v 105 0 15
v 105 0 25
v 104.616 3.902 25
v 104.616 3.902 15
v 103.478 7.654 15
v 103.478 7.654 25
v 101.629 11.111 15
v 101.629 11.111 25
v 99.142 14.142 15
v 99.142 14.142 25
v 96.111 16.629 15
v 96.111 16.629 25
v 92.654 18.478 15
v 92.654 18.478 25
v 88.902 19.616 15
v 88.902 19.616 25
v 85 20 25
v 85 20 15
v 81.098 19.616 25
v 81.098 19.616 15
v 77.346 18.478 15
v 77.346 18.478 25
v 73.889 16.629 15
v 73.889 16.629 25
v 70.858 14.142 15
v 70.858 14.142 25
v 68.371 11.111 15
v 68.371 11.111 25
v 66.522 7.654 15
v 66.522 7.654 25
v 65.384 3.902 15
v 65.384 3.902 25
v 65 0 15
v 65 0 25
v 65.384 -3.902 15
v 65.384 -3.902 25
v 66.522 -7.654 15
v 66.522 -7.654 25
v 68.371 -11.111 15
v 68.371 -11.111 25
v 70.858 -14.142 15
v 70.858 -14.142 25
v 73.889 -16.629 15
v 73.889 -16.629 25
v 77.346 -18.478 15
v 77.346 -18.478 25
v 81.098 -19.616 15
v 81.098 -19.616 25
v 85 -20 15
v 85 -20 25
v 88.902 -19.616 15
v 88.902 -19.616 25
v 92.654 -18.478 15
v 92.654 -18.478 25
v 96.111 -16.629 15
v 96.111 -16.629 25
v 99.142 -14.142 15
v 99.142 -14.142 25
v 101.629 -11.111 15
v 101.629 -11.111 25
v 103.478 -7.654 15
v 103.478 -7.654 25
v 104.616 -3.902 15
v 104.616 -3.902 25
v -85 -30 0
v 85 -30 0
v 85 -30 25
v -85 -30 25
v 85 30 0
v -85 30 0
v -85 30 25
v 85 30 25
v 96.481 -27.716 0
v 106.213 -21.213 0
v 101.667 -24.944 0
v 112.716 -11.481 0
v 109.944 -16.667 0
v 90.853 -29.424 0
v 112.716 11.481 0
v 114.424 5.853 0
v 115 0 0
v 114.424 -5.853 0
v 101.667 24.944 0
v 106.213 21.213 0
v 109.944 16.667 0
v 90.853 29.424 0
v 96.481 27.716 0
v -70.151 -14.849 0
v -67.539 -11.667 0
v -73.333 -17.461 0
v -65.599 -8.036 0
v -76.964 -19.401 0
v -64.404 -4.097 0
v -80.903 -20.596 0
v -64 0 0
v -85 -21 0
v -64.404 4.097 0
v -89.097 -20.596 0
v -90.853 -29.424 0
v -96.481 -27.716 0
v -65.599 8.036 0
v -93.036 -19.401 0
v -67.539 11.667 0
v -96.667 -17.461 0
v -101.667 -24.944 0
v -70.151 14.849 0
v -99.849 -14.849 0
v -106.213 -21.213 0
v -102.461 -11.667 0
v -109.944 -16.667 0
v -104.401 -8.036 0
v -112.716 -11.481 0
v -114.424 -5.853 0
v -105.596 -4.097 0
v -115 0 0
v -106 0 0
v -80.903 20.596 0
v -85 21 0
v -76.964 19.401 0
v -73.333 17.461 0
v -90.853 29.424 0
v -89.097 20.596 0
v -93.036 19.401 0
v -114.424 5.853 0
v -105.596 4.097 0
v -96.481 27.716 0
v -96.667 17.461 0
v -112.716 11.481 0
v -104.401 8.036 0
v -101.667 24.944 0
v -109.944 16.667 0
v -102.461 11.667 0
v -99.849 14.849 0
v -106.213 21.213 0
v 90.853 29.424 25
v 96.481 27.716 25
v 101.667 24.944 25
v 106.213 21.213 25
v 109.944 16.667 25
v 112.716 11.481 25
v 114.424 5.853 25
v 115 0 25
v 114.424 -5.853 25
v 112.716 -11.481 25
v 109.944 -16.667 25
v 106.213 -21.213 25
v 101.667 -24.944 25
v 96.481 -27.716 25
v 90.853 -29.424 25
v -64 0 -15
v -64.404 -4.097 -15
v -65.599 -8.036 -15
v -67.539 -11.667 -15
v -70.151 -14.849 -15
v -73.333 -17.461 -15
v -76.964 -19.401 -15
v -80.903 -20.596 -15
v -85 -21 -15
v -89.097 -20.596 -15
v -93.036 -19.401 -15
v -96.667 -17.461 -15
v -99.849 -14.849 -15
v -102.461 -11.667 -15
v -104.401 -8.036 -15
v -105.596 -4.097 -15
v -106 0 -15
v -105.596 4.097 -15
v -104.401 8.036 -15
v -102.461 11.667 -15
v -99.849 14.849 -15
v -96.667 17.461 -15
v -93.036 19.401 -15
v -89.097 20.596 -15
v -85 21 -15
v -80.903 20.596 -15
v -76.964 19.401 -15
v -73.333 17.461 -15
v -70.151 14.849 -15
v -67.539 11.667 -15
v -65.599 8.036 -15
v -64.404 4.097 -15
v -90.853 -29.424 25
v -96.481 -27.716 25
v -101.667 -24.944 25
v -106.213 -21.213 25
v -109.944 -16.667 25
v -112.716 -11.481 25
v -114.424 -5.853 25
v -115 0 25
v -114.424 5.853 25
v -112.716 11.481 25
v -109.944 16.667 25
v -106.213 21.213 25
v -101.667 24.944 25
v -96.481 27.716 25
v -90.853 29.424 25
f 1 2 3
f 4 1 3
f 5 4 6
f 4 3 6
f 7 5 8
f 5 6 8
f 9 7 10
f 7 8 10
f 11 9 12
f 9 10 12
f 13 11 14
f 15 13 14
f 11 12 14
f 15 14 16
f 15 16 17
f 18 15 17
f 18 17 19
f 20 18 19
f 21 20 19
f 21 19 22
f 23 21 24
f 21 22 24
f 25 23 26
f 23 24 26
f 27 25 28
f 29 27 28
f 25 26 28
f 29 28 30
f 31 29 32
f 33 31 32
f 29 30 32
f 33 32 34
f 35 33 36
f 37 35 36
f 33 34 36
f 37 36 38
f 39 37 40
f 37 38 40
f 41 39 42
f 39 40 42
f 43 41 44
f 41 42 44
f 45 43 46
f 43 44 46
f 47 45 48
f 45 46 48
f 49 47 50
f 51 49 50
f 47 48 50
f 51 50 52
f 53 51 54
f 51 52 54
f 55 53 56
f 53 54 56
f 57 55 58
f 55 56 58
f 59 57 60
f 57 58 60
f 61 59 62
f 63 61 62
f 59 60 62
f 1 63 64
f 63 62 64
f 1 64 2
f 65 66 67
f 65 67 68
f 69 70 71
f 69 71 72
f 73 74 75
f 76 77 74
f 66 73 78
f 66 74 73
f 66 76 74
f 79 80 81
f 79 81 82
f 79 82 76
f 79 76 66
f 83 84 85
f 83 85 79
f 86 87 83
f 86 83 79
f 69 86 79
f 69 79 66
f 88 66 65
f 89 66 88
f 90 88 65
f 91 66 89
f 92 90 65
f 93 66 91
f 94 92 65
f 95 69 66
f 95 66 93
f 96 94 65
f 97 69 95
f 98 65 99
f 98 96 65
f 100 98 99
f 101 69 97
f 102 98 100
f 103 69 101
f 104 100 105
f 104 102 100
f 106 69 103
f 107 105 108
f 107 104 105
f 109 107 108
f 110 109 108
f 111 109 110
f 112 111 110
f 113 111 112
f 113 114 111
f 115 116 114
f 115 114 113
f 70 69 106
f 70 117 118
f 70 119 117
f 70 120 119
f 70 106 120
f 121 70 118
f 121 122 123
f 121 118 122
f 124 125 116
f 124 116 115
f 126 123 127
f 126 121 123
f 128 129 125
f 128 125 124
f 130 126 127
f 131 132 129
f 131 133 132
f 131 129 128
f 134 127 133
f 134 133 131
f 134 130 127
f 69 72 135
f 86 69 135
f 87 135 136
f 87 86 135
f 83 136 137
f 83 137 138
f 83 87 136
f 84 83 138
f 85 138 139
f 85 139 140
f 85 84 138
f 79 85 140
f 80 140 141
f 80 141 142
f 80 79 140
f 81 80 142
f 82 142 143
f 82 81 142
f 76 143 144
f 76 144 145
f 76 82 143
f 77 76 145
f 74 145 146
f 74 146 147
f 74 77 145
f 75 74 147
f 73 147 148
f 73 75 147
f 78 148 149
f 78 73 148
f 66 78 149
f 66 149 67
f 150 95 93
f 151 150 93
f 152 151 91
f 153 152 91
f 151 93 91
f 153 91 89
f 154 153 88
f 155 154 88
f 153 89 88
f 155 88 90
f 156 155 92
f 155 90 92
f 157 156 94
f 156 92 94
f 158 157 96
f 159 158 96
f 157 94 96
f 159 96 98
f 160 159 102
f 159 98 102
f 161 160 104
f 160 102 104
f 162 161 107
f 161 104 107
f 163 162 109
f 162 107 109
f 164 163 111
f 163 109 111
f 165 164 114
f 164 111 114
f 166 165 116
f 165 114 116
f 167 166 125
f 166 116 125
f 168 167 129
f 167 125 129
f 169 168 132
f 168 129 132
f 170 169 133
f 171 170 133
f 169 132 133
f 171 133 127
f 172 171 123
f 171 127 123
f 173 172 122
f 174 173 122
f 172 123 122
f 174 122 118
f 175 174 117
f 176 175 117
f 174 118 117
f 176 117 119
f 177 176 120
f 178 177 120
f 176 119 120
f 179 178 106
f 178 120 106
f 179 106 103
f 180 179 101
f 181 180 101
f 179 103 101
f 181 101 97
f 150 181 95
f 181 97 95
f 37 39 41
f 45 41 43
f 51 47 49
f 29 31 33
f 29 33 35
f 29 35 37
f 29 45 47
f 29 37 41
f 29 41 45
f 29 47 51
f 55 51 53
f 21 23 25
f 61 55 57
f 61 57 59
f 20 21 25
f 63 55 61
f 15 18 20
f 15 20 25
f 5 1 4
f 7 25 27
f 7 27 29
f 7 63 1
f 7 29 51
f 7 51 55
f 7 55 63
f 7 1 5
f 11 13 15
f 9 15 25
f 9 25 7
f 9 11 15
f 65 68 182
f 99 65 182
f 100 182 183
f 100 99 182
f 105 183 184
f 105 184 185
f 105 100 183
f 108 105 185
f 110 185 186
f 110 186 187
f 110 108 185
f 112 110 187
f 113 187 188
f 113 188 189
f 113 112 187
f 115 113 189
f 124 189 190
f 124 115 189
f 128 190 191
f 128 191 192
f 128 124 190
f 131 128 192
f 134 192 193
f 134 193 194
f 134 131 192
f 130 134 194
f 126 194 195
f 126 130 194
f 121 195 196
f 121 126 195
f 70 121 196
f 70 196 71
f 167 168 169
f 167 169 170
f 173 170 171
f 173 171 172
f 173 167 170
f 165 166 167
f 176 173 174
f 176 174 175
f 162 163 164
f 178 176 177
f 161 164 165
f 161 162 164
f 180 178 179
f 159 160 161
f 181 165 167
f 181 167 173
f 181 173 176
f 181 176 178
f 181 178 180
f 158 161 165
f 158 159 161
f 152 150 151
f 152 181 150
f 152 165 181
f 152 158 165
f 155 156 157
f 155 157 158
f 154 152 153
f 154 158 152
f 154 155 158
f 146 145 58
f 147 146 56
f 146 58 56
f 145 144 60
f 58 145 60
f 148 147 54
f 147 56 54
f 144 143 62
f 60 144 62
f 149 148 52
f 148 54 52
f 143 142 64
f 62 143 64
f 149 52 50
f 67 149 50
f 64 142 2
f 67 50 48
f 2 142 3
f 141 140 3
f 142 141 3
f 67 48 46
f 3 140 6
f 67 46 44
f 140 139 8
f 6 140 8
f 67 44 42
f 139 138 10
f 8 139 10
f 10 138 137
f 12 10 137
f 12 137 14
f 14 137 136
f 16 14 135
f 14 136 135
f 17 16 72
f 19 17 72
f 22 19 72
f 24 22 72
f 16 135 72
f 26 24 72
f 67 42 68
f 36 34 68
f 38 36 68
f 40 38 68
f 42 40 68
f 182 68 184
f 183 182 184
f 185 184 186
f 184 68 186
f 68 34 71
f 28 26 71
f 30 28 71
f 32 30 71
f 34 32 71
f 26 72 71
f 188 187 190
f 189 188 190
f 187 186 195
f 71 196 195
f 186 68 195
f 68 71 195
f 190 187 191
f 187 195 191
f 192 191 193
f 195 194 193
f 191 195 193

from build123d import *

# Parameters (mm, degrees)
SALIENTE_EXTRUIR1_DEPTH = 25
CROQUIS3_R              = 21
SALIENTE_EXTRUIR2_DEPTH = 15
CROQUIS4_R              = 20
CORTAR_EXTRUIR1_DEPTH   = 10


with BuildPart() as part:
    # Croquis2 → Saliente-Extruir1 (new body)
    with BuildSketch(Plane.XY):
        with BuildLine():
            Line((-85, 30), (85, 30))
            ThreePointArc((85, 30), (115, 0), (85, -30))
            Line((85, -30), (-85, -30))
            ThreePointArc((-85, -30), (-115, 0), (-85, 30))
        make_face()
    extrude(amount=SALIENTE_EXTRUIR1_DEPTH)

    # Croquis3 → Saliente-Extruir2 (add)
    with BuildSketch(Plane(origin=(0, 0, 0), x_dir=(-1, 0, 0), z_dir=(0, 0, -1))):
        with Locations(Location((85, 0, 0), (0, 0, 180))):
            Circle(CROQUIS3_R)
    extrude(amount=SALIENTE_EXTRUIR2_DEPTH)

    # Croquis4 → Cortar-Extruir1 (cut)
    with BuildSketch(Plane.XY.offset(25)):
        with Locations((85, 0)):
            Circle(CROQUIS4_R)
    extrude(amount=-CORTAR_EXTRUIR1_DEPTH, mode=Mode.SUBTRACT)


solid = part.part
